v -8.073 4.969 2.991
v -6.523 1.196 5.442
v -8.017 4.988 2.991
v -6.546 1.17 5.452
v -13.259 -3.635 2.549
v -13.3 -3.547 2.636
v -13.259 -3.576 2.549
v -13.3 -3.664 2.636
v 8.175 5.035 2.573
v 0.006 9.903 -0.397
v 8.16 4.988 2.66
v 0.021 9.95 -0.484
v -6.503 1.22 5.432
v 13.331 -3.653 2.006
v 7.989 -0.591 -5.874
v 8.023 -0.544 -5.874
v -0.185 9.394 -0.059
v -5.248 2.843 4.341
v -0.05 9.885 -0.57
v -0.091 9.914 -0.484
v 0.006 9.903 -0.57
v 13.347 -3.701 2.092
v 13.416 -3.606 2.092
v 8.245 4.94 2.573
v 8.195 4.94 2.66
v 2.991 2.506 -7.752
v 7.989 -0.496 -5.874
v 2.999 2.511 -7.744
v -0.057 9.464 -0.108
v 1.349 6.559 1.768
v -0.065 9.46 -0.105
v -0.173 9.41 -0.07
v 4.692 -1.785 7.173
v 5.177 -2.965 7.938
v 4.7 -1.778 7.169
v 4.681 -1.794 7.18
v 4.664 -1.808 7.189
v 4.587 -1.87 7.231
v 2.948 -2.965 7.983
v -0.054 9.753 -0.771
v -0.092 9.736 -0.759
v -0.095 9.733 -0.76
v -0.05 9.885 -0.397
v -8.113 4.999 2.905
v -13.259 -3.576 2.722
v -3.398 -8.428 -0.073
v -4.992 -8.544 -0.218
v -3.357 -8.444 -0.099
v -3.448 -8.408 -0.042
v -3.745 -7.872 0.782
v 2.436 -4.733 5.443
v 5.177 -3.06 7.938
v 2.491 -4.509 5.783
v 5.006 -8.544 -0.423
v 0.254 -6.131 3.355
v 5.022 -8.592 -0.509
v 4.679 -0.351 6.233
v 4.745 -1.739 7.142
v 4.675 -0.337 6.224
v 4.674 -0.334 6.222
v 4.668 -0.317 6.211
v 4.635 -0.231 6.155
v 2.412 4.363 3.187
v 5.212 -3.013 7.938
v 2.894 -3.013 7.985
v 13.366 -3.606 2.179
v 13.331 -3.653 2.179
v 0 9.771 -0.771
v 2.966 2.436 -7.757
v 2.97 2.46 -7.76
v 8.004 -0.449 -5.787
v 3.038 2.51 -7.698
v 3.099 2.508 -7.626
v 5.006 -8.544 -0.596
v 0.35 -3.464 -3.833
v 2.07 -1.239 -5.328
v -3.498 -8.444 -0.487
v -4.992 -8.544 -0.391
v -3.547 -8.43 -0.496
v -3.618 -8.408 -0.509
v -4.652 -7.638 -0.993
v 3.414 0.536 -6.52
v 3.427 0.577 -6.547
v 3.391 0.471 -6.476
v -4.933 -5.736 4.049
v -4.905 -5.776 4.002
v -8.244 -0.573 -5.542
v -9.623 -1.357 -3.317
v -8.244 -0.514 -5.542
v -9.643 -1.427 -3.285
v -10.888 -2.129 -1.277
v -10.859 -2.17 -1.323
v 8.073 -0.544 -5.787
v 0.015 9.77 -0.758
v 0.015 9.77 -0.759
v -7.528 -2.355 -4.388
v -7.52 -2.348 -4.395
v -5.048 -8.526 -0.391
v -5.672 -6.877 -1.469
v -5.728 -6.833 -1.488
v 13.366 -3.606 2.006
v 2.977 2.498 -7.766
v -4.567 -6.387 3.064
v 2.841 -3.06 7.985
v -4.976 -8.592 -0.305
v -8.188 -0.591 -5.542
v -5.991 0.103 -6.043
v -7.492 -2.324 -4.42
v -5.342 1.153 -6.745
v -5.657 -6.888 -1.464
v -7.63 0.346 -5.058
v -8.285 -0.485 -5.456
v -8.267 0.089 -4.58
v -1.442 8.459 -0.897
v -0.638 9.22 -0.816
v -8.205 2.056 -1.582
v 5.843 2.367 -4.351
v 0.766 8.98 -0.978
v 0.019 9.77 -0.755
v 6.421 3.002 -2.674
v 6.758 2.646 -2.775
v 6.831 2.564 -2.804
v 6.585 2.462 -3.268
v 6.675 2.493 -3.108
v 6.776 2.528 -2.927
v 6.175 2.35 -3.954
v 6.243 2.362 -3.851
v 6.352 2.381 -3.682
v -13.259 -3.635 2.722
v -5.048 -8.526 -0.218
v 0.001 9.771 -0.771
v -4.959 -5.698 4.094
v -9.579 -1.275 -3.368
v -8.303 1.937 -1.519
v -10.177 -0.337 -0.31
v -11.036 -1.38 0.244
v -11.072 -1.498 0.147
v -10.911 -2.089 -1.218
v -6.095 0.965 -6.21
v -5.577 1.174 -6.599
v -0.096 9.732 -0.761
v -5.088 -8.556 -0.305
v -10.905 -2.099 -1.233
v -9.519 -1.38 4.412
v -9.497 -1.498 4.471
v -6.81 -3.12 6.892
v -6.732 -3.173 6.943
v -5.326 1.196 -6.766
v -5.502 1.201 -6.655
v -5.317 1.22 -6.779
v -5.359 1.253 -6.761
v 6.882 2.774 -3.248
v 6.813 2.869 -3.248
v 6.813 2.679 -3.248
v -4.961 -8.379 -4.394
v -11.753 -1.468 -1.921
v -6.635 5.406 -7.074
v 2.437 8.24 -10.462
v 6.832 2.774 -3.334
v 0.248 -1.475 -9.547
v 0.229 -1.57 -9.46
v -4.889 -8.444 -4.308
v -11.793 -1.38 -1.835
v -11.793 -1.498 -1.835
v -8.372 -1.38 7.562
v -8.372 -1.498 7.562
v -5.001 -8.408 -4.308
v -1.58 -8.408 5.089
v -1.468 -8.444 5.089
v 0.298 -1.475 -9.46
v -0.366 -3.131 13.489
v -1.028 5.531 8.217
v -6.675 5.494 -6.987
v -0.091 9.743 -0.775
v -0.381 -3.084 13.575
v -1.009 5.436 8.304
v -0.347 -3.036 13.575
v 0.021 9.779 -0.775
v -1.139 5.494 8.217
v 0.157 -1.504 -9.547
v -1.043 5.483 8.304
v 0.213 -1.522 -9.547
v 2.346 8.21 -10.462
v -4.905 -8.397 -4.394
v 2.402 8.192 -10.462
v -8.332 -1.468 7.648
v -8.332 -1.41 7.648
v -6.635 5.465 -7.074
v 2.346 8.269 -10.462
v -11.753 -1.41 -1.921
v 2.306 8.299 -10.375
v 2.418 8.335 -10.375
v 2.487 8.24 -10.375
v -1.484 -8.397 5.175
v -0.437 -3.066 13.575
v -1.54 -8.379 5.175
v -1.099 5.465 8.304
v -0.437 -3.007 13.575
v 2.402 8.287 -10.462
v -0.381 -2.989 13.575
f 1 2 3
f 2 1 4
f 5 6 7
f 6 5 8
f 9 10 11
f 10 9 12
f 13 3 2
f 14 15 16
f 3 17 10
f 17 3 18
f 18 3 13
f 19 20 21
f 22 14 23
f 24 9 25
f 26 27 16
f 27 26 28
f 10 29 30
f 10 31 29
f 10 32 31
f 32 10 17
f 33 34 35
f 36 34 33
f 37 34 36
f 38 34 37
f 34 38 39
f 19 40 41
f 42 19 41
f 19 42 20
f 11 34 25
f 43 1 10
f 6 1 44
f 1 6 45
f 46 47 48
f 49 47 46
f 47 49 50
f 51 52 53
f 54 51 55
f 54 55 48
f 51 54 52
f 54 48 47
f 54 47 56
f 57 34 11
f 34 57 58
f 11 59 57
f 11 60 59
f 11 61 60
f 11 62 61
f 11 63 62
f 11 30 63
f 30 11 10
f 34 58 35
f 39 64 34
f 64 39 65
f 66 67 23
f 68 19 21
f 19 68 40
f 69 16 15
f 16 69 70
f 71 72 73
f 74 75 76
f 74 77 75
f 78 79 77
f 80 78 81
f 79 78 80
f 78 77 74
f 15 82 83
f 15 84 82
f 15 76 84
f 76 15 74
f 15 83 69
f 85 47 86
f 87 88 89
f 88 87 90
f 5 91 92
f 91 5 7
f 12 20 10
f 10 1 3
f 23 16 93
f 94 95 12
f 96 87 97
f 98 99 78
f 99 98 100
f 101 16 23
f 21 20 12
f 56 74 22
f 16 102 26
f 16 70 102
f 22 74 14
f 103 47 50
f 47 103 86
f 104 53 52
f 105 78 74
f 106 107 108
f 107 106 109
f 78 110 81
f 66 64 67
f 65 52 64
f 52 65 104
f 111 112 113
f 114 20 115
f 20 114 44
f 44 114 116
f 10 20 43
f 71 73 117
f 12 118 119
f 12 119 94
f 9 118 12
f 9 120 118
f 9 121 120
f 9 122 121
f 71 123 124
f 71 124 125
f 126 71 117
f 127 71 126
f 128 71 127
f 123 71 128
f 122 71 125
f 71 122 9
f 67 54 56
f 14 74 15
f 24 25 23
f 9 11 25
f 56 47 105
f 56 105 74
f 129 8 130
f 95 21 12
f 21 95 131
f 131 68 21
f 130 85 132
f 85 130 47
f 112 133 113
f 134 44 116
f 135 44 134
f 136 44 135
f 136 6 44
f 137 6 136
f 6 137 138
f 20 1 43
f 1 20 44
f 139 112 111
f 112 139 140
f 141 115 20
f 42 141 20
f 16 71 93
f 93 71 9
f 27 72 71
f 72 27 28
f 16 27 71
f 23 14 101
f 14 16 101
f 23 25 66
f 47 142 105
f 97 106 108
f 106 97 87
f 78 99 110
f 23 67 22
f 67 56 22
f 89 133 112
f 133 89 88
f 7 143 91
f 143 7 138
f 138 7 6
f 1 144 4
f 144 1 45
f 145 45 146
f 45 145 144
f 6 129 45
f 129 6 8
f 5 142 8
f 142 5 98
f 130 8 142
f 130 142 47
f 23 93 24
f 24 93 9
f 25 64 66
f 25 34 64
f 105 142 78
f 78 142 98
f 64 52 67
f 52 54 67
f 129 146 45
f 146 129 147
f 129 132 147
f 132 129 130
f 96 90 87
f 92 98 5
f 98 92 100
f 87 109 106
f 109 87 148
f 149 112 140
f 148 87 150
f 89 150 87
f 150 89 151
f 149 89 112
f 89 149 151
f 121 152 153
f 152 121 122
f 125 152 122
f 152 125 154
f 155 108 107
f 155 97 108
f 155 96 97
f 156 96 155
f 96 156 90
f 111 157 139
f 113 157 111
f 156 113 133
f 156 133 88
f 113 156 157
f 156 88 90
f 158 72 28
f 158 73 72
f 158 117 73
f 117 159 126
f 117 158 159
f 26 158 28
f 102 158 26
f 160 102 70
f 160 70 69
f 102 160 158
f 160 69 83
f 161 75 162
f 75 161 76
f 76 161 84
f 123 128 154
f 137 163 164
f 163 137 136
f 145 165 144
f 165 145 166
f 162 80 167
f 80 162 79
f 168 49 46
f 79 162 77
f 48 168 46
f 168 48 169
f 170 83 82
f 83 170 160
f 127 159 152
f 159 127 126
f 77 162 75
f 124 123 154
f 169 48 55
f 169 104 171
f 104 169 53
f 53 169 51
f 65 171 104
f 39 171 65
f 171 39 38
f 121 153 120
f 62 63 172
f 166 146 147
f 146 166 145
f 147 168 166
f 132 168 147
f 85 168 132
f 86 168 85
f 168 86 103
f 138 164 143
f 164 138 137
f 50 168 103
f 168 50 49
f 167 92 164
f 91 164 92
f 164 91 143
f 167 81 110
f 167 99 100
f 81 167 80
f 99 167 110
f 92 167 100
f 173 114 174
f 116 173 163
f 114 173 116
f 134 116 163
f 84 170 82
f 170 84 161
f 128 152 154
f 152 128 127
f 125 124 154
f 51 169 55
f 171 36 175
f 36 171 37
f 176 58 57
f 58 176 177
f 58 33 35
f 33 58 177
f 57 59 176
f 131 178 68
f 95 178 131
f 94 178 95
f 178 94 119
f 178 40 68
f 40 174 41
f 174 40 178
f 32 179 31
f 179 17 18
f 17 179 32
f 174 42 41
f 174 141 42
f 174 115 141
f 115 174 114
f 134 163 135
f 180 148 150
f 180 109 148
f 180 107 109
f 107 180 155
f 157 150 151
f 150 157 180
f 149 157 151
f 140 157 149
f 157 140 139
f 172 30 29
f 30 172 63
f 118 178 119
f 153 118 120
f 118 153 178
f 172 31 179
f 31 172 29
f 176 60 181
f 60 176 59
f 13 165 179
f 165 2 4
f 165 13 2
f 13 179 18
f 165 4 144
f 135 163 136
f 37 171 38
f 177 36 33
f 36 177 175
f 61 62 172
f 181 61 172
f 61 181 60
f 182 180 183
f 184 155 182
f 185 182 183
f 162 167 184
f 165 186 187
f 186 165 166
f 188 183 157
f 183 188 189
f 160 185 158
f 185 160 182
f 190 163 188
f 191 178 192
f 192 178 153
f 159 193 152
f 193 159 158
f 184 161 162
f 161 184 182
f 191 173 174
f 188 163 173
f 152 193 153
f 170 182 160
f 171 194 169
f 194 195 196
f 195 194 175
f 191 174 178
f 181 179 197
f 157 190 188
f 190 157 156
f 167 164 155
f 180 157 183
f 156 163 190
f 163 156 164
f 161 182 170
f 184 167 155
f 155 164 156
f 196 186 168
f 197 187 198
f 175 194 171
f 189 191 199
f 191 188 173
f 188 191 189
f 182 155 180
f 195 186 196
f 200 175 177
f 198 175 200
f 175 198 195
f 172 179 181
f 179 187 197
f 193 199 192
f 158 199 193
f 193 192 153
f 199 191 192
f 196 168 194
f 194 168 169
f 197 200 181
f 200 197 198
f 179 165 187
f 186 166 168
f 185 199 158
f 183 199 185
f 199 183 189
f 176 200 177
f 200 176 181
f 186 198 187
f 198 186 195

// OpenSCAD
// Auto-generated OpenSCAD file

    inner_points = 10*[[0.019787791635657748, -0.14747479922424916, -0.945991098230778], [-0.6594221428128932, 0.5435520084277206, -0.6986940783281456], [-0.14991280650270666, -0.8349261534325039, 0.5088787692620549], [-0.8291227409512576, -0.14389934578053432, 0.7561757891646873], [0.678236401517591, 0.27739350328859563, -0.3247565582505837], [-0.0009735329309600027, 0.9684203109405655, -0.07745953834795122], [0.5733556639568946, -0.1474747992242489, 0.5744024690680427], [-0.10585427049165638, 0.5435520084277209, 0.8216994889706752], [-0.49203656667719314, -0.8349261534325041, -0.430776131605317], [-1.171246501125744, -0.14389934578053443, -0.18347911170268458], [0.2386660365849197, 0.823975401935654, -1.03751607052968], [-0.039688911151111894, -0.3036310288659764, 1.3488645926575207]];

    outer_points = 10*[[-0.8032370415536442, 0.4940095944296054, 0.2904678526749993], [-0.8203617651133189, -0.05438177544706052, -0.5455785869967444], [0.8144576288440243, 0.4940095944296054, 0.257332643050285], [0.7973329052843495, -0.05438177544706052, -0.5787137966214586], [-0.4836041683692091, -0.30128460130981144, 0.8055814019076486], [-0.5007288919288839, -0.8496759711864774, -0.030465037764095003], [0.5161861213561083, -0.30128460130981144, 0.7851027161352226], [0.4990613977964336, -0.8496759711864774, -0.05094372353652105], [-0.0009907313780924036, 0.9855284384520768, -0.04836851458879643], [-0.01811545493776716, 0.43713706857541085, -0.8844149542605402], [-1.321886530779726, -0.3605543525439317, 0.26357607217362455], [1.3315709135143465, -0.3605543525439317, 0.20922535305718643]];

    // Convex hull for inner set (I)
    module inner_hull() {
        hull() {
            for (p = inner_points) {
                translate(p) sphere(r=0.1);
            }
        }
    }

    // Convex hull for outer set (O) minus inner hull (O \ I)
    module outer_minus_inner() {
        difference() {
            hull() {
                for (p = outer_points) {
                    translate(p) sphere(r=0.1);
                }
            }
            inner_hull(); // Subtract inner hull
        }
    }

    // Convex hull for outer set (O) minus all translated inner hulls
    module outer_minus_AllTranslationInner() {
        difference() {
            hull() {
                for (p = outer_points) {
                    translate(p) sphere(r=0.1);
                }
            }
            hull() {
                translate([0,0,50]) inner_hull();
                translate([0,0,-50]) inner_hull();
            }; // Subtract translated inner hulls
        }
    }

    // Difference between outer_minus_inner and outer_minus_AllTranslationInner
    module outer_minus_inner_diff() {
        difference() {
            // Outer minus inner
            difference() {
                hull() {
                    for (p = outer_points) {
                        translate(p) sphere(r=0.1);
                    }
                }
                inner_hull();
            }

            // Subtract Outer minus AllTranslationInner
            difference() {
                hull() {
                    for (p = outer_points) {
                        translate(p) sphere(r=0.1);
                    }
                }
                hull() {
                    translate([0,0,50]) inner_hull();
                    translate([0,0,-50]) inner_hull();
                };
            }
        }
    }

    // Rendering all with colors applied
    color([1, 0, 0, 0.5]) inner_hull(); // Transparent red
    color([0, 1, 0, 1]) outer_minus_AllTranslationInner(); // Opaque green
    color([1, 1, 0, 1]) outer_minus_inner_diff(); // Opaque yellow
    
